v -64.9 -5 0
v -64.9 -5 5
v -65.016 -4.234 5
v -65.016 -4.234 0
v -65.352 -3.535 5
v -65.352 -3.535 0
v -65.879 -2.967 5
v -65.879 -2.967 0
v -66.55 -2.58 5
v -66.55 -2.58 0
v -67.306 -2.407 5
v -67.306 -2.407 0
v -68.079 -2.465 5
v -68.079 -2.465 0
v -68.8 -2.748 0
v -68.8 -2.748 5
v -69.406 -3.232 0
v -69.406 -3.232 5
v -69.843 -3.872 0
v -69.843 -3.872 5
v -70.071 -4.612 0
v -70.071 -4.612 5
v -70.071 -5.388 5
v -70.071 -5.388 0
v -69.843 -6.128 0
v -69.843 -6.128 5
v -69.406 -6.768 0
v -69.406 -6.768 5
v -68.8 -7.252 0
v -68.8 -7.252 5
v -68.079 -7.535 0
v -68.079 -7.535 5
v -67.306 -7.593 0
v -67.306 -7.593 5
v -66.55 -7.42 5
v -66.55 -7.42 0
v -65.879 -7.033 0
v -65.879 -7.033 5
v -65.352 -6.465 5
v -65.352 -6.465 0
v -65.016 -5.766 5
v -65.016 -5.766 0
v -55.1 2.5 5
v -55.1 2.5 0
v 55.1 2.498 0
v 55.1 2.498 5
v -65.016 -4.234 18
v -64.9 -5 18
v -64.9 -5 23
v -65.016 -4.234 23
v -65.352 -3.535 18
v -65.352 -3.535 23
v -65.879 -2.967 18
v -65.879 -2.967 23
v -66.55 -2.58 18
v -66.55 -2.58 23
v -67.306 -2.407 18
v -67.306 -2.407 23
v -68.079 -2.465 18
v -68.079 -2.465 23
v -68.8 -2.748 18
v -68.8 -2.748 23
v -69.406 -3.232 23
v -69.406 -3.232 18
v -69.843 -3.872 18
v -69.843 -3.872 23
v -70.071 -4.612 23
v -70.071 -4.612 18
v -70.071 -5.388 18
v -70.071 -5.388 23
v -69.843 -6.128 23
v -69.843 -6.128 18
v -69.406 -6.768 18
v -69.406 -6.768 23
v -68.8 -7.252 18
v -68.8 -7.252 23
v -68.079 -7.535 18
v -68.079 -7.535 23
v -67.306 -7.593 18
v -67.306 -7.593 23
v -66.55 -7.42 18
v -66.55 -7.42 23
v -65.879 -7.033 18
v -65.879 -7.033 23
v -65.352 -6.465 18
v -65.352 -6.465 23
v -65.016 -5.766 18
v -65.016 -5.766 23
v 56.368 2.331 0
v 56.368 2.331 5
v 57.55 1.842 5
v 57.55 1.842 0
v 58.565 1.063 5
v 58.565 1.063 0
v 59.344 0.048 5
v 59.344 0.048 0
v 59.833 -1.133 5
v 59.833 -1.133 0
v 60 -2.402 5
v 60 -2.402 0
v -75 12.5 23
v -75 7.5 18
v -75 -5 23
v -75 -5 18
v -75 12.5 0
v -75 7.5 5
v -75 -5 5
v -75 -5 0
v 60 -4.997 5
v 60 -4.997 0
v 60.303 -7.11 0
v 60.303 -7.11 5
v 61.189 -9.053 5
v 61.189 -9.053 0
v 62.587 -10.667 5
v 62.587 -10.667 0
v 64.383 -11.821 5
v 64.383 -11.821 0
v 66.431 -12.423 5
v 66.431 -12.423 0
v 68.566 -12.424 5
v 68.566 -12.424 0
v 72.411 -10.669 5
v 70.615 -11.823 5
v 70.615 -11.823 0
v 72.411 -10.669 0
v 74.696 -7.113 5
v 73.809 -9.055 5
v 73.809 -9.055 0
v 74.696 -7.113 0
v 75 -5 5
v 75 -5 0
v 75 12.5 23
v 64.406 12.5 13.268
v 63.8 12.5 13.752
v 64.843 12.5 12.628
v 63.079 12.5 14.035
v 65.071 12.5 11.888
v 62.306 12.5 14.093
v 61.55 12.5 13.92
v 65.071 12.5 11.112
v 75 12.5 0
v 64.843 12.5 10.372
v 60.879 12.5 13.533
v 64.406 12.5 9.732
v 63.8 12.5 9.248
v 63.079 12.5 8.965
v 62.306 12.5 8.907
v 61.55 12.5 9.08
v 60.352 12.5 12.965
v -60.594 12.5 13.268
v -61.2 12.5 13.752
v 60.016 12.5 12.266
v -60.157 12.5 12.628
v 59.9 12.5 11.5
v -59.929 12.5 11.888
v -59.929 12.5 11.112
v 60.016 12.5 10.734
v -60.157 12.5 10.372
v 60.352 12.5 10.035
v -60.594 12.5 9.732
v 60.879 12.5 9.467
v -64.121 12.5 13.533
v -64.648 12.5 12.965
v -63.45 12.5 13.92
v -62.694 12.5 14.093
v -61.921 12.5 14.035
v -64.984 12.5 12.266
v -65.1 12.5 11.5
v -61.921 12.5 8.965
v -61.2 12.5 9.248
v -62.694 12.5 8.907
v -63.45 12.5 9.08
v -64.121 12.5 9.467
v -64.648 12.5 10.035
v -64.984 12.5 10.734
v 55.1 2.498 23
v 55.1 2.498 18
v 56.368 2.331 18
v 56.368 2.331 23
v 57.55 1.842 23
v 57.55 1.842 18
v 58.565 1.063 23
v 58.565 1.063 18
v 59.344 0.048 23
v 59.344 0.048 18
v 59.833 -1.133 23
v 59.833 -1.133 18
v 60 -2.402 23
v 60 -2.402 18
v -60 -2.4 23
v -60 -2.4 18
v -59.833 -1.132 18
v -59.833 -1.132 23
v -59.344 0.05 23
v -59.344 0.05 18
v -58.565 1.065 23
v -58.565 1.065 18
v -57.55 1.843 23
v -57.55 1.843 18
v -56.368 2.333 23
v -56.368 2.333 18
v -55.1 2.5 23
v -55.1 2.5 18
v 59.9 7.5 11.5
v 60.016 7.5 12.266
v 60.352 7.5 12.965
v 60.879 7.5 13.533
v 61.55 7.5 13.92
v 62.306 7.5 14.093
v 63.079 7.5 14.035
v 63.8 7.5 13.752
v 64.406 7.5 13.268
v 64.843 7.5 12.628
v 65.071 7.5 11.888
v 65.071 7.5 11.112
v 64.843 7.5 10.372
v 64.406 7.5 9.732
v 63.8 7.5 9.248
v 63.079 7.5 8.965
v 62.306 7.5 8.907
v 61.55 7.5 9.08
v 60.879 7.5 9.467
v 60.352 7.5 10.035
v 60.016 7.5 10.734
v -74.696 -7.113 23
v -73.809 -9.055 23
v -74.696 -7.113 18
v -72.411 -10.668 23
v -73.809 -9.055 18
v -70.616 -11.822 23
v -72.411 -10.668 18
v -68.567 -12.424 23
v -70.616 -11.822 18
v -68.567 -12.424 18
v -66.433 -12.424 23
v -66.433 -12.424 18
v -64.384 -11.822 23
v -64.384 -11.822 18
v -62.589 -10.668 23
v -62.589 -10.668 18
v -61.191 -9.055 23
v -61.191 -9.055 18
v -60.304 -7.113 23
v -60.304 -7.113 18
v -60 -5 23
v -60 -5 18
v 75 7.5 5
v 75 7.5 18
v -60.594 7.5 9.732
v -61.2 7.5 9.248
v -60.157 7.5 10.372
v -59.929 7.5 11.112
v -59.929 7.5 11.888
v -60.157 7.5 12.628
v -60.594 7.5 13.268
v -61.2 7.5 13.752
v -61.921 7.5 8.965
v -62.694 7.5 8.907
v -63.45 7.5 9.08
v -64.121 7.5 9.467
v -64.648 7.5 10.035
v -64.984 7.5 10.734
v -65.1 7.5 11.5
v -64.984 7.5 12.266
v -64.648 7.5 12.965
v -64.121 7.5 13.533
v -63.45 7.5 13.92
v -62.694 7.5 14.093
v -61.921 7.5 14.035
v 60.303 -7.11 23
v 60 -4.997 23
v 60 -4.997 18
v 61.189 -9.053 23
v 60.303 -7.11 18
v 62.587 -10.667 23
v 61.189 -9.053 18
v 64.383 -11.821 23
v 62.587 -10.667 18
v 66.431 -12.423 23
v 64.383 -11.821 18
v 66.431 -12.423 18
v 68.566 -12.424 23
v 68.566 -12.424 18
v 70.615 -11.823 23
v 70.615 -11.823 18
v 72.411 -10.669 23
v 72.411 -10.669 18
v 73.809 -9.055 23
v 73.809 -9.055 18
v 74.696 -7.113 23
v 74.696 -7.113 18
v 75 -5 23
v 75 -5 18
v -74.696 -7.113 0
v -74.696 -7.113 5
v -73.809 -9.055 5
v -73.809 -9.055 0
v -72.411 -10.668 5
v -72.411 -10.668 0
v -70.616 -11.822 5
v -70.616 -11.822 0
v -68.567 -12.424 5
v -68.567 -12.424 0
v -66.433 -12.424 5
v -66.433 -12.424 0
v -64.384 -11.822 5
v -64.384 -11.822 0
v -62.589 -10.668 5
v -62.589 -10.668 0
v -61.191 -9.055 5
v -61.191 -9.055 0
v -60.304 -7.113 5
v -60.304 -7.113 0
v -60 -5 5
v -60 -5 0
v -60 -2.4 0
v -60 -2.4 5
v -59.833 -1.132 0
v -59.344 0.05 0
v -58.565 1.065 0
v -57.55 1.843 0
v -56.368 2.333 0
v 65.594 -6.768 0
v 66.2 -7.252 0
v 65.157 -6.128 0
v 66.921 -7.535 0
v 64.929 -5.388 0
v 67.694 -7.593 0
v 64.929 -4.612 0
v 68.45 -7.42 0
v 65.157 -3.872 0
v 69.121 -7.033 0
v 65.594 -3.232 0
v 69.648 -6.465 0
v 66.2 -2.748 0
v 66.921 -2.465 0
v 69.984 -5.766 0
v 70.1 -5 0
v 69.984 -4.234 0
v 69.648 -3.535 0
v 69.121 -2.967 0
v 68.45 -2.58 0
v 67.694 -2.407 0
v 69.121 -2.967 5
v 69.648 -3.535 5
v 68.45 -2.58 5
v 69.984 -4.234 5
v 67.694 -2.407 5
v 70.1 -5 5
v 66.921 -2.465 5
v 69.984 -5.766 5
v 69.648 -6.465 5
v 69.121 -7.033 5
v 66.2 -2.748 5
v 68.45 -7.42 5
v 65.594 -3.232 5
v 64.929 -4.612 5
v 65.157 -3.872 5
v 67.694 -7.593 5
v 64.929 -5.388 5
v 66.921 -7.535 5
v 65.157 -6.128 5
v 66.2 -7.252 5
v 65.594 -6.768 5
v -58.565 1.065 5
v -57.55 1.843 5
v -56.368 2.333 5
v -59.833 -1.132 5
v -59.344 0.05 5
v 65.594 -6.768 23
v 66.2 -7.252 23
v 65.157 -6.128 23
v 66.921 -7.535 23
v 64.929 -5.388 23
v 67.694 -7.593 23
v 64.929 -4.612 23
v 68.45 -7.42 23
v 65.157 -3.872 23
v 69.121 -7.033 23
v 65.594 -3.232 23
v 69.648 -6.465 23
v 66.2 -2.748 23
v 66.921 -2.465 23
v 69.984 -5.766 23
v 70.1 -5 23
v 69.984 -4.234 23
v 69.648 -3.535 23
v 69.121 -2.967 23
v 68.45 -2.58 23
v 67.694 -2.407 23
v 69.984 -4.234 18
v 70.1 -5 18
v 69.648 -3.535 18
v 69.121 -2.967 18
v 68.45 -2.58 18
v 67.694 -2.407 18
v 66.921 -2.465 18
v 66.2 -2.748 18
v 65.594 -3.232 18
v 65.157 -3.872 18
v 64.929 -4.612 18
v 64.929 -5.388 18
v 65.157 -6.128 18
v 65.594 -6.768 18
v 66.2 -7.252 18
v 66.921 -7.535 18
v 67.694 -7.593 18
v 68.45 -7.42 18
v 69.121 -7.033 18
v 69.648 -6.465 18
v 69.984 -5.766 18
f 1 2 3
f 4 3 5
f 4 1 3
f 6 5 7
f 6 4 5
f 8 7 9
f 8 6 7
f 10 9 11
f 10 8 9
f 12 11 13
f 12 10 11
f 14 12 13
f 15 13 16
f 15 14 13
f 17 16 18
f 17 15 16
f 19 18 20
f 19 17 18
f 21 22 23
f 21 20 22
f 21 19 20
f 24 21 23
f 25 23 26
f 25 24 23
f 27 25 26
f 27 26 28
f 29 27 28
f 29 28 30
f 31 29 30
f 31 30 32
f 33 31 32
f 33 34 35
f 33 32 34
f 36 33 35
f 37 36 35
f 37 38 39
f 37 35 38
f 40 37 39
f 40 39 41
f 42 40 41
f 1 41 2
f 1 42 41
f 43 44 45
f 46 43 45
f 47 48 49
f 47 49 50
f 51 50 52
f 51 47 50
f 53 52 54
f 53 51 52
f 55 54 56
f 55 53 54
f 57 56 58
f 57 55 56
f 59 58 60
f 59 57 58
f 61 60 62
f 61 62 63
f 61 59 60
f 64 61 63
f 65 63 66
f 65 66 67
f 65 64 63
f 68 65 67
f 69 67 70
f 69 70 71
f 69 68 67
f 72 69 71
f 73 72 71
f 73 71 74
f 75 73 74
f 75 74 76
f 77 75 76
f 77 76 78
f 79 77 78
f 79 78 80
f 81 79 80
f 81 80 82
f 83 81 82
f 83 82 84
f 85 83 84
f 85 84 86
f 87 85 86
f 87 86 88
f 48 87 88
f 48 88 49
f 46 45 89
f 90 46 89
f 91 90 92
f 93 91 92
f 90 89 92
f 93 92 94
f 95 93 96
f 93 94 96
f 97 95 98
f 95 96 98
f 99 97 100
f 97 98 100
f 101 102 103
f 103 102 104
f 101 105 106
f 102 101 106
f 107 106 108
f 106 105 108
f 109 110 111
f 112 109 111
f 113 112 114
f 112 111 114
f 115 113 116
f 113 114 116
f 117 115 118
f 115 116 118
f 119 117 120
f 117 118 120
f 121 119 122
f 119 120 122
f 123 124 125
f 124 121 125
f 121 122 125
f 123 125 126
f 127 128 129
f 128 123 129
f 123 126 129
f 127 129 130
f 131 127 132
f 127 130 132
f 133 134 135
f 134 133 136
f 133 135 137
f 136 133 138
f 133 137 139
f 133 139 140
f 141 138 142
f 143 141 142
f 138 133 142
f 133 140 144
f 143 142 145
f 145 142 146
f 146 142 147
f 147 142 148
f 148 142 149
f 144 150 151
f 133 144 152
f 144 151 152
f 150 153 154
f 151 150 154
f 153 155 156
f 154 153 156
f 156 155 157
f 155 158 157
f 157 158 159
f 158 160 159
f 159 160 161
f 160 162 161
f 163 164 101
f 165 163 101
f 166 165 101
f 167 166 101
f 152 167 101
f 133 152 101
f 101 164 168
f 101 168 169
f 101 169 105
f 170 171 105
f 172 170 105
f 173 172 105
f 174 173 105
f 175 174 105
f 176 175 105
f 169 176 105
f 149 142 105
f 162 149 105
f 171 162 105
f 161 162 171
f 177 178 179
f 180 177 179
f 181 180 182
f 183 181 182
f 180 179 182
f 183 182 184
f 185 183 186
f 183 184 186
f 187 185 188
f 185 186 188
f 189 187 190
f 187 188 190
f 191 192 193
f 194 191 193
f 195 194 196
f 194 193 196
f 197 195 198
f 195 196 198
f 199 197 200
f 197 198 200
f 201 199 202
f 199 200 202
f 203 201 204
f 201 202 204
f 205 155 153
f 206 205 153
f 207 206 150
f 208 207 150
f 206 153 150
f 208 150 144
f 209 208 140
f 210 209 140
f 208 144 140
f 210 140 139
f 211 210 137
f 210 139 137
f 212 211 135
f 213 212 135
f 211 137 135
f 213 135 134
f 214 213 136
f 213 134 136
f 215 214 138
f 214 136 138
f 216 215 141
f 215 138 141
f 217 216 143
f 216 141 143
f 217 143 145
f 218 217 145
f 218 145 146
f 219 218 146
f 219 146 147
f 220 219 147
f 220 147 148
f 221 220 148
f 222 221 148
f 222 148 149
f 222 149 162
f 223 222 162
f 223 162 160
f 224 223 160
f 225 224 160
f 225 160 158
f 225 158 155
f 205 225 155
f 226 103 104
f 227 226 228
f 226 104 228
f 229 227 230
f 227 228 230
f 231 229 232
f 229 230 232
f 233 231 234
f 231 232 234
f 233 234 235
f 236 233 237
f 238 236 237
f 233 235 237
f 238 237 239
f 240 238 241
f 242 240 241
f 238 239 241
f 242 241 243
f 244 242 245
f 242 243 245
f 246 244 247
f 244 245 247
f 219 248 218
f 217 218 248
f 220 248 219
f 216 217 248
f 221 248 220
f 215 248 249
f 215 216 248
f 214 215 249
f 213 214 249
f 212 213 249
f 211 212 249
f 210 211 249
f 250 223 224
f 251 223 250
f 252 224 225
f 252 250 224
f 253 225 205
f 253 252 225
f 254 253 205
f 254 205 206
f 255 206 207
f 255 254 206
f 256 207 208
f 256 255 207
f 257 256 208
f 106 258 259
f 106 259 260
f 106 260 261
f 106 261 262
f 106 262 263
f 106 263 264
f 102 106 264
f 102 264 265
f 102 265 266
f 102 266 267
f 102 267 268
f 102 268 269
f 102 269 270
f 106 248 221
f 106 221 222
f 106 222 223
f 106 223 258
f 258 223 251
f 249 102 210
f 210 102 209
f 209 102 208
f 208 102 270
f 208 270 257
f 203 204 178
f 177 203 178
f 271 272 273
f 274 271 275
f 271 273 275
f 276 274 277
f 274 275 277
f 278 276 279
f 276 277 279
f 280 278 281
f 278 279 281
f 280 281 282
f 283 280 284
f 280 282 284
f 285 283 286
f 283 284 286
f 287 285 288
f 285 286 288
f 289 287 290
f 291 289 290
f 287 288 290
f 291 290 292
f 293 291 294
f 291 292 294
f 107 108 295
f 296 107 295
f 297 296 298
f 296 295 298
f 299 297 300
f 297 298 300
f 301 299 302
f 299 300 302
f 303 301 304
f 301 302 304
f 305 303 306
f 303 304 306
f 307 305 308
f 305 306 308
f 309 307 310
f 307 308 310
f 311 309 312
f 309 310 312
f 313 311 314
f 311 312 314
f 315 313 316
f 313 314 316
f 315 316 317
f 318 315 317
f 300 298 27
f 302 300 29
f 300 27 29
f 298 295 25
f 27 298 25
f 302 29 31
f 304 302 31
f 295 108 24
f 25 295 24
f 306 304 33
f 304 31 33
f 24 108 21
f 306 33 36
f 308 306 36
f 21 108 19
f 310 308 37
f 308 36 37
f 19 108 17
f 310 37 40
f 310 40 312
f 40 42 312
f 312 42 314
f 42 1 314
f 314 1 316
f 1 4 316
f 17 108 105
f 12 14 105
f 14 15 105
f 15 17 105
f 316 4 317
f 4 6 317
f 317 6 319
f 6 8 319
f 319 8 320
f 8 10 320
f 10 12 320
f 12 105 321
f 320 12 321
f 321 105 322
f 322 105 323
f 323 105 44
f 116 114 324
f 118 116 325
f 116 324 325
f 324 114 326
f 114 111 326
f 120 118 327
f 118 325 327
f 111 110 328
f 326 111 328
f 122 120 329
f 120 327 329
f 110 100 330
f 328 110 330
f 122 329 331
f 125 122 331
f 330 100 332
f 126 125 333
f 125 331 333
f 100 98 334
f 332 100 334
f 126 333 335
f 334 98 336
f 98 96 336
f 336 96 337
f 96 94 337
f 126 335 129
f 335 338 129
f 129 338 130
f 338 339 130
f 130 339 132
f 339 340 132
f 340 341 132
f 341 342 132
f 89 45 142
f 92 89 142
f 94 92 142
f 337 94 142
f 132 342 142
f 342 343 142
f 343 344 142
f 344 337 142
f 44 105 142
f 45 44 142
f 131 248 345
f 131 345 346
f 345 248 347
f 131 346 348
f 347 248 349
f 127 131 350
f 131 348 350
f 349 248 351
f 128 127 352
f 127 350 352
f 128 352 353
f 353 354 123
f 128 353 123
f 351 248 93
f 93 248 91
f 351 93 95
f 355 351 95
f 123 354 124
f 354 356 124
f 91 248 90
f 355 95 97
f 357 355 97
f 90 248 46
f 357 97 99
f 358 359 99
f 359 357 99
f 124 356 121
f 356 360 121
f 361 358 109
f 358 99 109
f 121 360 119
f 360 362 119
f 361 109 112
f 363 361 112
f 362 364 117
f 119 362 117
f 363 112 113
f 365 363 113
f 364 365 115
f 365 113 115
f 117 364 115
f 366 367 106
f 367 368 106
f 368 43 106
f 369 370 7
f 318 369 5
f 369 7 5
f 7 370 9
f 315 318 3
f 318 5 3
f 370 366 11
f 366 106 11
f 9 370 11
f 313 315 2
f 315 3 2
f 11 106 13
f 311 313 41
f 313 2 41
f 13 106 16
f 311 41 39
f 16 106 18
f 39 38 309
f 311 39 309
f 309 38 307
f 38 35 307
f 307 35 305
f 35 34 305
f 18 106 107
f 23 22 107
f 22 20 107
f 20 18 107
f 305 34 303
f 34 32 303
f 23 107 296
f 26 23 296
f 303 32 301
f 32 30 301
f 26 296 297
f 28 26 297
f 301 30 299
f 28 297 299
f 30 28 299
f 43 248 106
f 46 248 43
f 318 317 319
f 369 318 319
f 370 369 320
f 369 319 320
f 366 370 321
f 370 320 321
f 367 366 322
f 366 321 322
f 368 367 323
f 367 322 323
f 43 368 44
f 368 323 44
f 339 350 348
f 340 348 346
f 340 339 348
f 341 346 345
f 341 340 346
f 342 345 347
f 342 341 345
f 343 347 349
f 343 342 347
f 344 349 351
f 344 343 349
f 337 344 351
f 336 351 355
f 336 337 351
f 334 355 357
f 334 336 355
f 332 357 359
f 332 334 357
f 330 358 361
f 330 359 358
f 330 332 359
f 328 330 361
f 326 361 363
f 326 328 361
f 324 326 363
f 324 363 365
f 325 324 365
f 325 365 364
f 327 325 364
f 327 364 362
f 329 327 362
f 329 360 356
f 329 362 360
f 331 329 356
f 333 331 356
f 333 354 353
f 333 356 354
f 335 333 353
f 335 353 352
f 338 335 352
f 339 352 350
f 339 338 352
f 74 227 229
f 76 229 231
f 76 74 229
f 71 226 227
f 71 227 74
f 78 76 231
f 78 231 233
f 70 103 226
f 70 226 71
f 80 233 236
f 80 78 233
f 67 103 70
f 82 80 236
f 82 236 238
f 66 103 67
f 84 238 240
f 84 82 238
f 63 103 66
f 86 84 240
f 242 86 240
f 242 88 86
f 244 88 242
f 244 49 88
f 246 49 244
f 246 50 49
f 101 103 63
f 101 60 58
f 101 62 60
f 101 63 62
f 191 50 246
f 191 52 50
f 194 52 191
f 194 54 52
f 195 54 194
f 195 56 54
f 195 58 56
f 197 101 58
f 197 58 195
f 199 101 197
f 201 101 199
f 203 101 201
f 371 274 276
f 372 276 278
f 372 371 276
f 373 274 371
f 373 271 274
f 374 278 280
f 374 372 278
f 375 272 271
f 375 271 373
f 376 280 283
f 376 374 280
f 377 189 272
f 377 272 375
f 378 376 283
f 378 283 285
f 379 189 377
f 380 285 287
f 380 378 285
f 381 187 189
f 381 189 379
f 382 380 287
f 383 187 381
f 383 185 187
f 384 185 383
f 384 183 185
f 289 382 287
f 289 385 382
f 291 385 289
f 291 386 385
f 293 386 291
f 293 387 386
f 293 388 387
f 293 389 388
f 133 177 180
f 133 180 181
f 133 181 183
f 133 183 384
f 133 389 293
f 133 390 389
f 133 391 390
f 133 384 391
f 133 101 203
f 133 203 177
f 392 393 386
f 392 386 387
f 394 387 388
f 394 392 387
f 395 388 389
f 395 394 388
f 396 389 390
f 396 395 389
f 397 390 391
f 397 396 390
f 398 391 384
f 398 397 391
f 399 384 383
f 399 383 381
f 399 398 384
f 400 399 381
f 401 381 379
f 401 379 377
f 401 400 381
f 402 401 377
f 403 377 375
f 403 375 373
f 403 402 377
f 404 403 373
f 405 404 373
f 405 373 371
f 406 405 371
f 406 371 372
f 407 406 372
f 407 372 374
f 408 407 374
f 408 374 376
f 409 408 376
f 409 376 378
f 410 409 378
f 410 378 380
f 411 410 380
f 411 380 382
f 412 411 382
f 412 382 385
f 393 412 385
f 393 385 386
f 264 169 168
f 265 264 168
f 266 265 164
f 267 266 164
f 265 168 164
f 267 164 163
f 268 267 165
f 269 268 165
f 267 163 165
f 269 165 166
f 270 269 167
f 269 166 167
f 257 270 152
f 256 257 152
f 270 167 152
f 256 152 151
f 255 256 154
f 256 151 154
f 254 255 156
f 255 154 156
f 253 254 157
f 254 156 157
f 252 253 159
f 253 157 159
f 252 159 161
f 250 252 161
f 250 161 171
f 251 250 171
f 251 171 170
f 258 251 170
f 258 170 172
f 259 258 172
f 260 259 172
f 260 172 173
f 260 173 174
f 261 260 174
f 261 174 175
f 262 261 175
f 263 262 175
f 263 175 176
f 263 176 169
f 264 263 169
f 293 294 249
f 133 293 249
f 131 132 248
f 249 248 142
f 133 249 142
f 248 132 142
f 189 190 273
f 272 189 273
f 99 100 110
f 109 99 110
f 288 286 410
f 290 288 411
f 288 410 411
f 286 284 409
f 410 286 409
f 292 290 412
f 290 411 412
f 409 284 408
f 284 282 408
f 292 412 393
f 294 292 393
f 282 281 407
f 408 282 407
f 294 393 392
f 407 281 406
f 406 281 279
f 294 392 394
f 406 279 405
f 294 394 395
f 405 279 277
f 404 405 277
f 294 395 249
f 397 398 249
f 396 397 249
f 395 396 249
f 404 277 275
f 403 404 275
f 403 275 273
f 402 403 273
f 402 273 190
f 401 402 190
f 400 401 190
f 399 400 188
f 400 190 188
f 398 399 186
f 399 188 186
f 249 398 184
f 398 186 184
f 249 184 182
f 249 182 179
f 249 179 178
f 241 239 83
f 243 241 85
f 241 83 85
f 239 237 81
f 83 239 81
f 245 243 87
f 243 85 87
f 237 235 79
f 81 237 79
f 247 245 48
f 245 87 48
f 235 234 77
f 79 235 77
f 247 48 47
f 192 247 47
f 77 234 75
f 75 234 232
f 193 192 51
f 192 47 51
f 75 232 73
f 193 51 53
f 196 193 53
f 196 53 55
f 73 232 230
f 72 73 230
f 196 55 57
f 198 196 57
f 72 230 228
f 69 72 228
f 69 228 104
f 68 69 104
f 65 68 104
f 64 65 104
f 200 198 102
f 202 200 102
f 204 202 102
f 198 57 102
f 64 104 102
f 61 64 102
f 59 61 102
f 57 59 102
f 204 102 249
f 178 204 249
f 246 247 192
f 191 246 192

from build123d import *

# Parameters (mm, degrees)
F0_R     = 2.6
F1_DEPTH = 23
F2_W     = 12.5
F2_H     = 13
F2_W_2   = 16.9316109251
F3_DEPTH = 150.001
F4_R     = 2.6
F5_DEPTH = 25.001


with BuildPart() as f1:
    # F0 (on Top) → F1 (new body)
    with BuildSketch(Plane.XY):
        with BuildLine():
            Line((75, -5), (75, 12.5))
            Line((75, 12.5), (-75, 12.5))
            Line((-75, 12.5), (-75, -5))
            ThreePointArc((-75, -5), (-67.5, -12.5), (-60, -5))
            Line((-60, -5), (-60, -2.4001719305))
            ThreePointArc((-60, -2.4001719305), (-58.5647992072, 1.0646753177), (-55.0999320596, 2.499828069))
            Line((-55.0999320596, 2.499828069), (55.1000685735, 2.4983001034))
            ThreePointArc((55.1000685735, 2.4983001034), (58.5648478814, 1.0630993111), (60.0000006331, -2.4016998961))
            Line((60.0000006331, -2.4016998961), (60.0000006331, -4.9969182812))
            ThreePointArc((60.0000006331, -4.9969182812), (67.4984591406, -12.4999998417), (75, -5))
        make_face()
        with Locations((-67.5, -5)):
            Circle(F0_R, mode=Mode.SUBTRACT)
        with Locations((67.5, -5)):
            Circle(F0_R, mode=Mode.SUBTRACT)
    extrude(amount=F1_DEPTH)

    # F2 (on face) → F3 (cut, through all)
    with BuildSketch(Plane(origin=(-75, 0, 0), x_dir=(0, -1, 0), z_dir=(-1, 0, 0))):
        with Locations((-1.25, 11.5)):
            Rectangle(F2_W, F2_H)
        with Locations((13.4658054625, 11.5)):
            Rectangle(F2_W_2, F2_H)
    extrude(amount=-F3_DEPTH, mode=Mode.SUBTRACT)

    # F4 (on face) → F5 (cut, through all)
    with BuildSketch(Plane(origin=(0, 12.5, 0), x_dir=(-1, 0, 0), z_dir=(0, 1, 0))):
        with Locations((62.5, 11.5)):
            Circle(F4_R)
        with Locations((-62.5, 11.5)):
            Circle(F4_R)
    extrude(amount=-F5_DEPTH, mode=Mode.SUBTRACT)


solid = f1.part
